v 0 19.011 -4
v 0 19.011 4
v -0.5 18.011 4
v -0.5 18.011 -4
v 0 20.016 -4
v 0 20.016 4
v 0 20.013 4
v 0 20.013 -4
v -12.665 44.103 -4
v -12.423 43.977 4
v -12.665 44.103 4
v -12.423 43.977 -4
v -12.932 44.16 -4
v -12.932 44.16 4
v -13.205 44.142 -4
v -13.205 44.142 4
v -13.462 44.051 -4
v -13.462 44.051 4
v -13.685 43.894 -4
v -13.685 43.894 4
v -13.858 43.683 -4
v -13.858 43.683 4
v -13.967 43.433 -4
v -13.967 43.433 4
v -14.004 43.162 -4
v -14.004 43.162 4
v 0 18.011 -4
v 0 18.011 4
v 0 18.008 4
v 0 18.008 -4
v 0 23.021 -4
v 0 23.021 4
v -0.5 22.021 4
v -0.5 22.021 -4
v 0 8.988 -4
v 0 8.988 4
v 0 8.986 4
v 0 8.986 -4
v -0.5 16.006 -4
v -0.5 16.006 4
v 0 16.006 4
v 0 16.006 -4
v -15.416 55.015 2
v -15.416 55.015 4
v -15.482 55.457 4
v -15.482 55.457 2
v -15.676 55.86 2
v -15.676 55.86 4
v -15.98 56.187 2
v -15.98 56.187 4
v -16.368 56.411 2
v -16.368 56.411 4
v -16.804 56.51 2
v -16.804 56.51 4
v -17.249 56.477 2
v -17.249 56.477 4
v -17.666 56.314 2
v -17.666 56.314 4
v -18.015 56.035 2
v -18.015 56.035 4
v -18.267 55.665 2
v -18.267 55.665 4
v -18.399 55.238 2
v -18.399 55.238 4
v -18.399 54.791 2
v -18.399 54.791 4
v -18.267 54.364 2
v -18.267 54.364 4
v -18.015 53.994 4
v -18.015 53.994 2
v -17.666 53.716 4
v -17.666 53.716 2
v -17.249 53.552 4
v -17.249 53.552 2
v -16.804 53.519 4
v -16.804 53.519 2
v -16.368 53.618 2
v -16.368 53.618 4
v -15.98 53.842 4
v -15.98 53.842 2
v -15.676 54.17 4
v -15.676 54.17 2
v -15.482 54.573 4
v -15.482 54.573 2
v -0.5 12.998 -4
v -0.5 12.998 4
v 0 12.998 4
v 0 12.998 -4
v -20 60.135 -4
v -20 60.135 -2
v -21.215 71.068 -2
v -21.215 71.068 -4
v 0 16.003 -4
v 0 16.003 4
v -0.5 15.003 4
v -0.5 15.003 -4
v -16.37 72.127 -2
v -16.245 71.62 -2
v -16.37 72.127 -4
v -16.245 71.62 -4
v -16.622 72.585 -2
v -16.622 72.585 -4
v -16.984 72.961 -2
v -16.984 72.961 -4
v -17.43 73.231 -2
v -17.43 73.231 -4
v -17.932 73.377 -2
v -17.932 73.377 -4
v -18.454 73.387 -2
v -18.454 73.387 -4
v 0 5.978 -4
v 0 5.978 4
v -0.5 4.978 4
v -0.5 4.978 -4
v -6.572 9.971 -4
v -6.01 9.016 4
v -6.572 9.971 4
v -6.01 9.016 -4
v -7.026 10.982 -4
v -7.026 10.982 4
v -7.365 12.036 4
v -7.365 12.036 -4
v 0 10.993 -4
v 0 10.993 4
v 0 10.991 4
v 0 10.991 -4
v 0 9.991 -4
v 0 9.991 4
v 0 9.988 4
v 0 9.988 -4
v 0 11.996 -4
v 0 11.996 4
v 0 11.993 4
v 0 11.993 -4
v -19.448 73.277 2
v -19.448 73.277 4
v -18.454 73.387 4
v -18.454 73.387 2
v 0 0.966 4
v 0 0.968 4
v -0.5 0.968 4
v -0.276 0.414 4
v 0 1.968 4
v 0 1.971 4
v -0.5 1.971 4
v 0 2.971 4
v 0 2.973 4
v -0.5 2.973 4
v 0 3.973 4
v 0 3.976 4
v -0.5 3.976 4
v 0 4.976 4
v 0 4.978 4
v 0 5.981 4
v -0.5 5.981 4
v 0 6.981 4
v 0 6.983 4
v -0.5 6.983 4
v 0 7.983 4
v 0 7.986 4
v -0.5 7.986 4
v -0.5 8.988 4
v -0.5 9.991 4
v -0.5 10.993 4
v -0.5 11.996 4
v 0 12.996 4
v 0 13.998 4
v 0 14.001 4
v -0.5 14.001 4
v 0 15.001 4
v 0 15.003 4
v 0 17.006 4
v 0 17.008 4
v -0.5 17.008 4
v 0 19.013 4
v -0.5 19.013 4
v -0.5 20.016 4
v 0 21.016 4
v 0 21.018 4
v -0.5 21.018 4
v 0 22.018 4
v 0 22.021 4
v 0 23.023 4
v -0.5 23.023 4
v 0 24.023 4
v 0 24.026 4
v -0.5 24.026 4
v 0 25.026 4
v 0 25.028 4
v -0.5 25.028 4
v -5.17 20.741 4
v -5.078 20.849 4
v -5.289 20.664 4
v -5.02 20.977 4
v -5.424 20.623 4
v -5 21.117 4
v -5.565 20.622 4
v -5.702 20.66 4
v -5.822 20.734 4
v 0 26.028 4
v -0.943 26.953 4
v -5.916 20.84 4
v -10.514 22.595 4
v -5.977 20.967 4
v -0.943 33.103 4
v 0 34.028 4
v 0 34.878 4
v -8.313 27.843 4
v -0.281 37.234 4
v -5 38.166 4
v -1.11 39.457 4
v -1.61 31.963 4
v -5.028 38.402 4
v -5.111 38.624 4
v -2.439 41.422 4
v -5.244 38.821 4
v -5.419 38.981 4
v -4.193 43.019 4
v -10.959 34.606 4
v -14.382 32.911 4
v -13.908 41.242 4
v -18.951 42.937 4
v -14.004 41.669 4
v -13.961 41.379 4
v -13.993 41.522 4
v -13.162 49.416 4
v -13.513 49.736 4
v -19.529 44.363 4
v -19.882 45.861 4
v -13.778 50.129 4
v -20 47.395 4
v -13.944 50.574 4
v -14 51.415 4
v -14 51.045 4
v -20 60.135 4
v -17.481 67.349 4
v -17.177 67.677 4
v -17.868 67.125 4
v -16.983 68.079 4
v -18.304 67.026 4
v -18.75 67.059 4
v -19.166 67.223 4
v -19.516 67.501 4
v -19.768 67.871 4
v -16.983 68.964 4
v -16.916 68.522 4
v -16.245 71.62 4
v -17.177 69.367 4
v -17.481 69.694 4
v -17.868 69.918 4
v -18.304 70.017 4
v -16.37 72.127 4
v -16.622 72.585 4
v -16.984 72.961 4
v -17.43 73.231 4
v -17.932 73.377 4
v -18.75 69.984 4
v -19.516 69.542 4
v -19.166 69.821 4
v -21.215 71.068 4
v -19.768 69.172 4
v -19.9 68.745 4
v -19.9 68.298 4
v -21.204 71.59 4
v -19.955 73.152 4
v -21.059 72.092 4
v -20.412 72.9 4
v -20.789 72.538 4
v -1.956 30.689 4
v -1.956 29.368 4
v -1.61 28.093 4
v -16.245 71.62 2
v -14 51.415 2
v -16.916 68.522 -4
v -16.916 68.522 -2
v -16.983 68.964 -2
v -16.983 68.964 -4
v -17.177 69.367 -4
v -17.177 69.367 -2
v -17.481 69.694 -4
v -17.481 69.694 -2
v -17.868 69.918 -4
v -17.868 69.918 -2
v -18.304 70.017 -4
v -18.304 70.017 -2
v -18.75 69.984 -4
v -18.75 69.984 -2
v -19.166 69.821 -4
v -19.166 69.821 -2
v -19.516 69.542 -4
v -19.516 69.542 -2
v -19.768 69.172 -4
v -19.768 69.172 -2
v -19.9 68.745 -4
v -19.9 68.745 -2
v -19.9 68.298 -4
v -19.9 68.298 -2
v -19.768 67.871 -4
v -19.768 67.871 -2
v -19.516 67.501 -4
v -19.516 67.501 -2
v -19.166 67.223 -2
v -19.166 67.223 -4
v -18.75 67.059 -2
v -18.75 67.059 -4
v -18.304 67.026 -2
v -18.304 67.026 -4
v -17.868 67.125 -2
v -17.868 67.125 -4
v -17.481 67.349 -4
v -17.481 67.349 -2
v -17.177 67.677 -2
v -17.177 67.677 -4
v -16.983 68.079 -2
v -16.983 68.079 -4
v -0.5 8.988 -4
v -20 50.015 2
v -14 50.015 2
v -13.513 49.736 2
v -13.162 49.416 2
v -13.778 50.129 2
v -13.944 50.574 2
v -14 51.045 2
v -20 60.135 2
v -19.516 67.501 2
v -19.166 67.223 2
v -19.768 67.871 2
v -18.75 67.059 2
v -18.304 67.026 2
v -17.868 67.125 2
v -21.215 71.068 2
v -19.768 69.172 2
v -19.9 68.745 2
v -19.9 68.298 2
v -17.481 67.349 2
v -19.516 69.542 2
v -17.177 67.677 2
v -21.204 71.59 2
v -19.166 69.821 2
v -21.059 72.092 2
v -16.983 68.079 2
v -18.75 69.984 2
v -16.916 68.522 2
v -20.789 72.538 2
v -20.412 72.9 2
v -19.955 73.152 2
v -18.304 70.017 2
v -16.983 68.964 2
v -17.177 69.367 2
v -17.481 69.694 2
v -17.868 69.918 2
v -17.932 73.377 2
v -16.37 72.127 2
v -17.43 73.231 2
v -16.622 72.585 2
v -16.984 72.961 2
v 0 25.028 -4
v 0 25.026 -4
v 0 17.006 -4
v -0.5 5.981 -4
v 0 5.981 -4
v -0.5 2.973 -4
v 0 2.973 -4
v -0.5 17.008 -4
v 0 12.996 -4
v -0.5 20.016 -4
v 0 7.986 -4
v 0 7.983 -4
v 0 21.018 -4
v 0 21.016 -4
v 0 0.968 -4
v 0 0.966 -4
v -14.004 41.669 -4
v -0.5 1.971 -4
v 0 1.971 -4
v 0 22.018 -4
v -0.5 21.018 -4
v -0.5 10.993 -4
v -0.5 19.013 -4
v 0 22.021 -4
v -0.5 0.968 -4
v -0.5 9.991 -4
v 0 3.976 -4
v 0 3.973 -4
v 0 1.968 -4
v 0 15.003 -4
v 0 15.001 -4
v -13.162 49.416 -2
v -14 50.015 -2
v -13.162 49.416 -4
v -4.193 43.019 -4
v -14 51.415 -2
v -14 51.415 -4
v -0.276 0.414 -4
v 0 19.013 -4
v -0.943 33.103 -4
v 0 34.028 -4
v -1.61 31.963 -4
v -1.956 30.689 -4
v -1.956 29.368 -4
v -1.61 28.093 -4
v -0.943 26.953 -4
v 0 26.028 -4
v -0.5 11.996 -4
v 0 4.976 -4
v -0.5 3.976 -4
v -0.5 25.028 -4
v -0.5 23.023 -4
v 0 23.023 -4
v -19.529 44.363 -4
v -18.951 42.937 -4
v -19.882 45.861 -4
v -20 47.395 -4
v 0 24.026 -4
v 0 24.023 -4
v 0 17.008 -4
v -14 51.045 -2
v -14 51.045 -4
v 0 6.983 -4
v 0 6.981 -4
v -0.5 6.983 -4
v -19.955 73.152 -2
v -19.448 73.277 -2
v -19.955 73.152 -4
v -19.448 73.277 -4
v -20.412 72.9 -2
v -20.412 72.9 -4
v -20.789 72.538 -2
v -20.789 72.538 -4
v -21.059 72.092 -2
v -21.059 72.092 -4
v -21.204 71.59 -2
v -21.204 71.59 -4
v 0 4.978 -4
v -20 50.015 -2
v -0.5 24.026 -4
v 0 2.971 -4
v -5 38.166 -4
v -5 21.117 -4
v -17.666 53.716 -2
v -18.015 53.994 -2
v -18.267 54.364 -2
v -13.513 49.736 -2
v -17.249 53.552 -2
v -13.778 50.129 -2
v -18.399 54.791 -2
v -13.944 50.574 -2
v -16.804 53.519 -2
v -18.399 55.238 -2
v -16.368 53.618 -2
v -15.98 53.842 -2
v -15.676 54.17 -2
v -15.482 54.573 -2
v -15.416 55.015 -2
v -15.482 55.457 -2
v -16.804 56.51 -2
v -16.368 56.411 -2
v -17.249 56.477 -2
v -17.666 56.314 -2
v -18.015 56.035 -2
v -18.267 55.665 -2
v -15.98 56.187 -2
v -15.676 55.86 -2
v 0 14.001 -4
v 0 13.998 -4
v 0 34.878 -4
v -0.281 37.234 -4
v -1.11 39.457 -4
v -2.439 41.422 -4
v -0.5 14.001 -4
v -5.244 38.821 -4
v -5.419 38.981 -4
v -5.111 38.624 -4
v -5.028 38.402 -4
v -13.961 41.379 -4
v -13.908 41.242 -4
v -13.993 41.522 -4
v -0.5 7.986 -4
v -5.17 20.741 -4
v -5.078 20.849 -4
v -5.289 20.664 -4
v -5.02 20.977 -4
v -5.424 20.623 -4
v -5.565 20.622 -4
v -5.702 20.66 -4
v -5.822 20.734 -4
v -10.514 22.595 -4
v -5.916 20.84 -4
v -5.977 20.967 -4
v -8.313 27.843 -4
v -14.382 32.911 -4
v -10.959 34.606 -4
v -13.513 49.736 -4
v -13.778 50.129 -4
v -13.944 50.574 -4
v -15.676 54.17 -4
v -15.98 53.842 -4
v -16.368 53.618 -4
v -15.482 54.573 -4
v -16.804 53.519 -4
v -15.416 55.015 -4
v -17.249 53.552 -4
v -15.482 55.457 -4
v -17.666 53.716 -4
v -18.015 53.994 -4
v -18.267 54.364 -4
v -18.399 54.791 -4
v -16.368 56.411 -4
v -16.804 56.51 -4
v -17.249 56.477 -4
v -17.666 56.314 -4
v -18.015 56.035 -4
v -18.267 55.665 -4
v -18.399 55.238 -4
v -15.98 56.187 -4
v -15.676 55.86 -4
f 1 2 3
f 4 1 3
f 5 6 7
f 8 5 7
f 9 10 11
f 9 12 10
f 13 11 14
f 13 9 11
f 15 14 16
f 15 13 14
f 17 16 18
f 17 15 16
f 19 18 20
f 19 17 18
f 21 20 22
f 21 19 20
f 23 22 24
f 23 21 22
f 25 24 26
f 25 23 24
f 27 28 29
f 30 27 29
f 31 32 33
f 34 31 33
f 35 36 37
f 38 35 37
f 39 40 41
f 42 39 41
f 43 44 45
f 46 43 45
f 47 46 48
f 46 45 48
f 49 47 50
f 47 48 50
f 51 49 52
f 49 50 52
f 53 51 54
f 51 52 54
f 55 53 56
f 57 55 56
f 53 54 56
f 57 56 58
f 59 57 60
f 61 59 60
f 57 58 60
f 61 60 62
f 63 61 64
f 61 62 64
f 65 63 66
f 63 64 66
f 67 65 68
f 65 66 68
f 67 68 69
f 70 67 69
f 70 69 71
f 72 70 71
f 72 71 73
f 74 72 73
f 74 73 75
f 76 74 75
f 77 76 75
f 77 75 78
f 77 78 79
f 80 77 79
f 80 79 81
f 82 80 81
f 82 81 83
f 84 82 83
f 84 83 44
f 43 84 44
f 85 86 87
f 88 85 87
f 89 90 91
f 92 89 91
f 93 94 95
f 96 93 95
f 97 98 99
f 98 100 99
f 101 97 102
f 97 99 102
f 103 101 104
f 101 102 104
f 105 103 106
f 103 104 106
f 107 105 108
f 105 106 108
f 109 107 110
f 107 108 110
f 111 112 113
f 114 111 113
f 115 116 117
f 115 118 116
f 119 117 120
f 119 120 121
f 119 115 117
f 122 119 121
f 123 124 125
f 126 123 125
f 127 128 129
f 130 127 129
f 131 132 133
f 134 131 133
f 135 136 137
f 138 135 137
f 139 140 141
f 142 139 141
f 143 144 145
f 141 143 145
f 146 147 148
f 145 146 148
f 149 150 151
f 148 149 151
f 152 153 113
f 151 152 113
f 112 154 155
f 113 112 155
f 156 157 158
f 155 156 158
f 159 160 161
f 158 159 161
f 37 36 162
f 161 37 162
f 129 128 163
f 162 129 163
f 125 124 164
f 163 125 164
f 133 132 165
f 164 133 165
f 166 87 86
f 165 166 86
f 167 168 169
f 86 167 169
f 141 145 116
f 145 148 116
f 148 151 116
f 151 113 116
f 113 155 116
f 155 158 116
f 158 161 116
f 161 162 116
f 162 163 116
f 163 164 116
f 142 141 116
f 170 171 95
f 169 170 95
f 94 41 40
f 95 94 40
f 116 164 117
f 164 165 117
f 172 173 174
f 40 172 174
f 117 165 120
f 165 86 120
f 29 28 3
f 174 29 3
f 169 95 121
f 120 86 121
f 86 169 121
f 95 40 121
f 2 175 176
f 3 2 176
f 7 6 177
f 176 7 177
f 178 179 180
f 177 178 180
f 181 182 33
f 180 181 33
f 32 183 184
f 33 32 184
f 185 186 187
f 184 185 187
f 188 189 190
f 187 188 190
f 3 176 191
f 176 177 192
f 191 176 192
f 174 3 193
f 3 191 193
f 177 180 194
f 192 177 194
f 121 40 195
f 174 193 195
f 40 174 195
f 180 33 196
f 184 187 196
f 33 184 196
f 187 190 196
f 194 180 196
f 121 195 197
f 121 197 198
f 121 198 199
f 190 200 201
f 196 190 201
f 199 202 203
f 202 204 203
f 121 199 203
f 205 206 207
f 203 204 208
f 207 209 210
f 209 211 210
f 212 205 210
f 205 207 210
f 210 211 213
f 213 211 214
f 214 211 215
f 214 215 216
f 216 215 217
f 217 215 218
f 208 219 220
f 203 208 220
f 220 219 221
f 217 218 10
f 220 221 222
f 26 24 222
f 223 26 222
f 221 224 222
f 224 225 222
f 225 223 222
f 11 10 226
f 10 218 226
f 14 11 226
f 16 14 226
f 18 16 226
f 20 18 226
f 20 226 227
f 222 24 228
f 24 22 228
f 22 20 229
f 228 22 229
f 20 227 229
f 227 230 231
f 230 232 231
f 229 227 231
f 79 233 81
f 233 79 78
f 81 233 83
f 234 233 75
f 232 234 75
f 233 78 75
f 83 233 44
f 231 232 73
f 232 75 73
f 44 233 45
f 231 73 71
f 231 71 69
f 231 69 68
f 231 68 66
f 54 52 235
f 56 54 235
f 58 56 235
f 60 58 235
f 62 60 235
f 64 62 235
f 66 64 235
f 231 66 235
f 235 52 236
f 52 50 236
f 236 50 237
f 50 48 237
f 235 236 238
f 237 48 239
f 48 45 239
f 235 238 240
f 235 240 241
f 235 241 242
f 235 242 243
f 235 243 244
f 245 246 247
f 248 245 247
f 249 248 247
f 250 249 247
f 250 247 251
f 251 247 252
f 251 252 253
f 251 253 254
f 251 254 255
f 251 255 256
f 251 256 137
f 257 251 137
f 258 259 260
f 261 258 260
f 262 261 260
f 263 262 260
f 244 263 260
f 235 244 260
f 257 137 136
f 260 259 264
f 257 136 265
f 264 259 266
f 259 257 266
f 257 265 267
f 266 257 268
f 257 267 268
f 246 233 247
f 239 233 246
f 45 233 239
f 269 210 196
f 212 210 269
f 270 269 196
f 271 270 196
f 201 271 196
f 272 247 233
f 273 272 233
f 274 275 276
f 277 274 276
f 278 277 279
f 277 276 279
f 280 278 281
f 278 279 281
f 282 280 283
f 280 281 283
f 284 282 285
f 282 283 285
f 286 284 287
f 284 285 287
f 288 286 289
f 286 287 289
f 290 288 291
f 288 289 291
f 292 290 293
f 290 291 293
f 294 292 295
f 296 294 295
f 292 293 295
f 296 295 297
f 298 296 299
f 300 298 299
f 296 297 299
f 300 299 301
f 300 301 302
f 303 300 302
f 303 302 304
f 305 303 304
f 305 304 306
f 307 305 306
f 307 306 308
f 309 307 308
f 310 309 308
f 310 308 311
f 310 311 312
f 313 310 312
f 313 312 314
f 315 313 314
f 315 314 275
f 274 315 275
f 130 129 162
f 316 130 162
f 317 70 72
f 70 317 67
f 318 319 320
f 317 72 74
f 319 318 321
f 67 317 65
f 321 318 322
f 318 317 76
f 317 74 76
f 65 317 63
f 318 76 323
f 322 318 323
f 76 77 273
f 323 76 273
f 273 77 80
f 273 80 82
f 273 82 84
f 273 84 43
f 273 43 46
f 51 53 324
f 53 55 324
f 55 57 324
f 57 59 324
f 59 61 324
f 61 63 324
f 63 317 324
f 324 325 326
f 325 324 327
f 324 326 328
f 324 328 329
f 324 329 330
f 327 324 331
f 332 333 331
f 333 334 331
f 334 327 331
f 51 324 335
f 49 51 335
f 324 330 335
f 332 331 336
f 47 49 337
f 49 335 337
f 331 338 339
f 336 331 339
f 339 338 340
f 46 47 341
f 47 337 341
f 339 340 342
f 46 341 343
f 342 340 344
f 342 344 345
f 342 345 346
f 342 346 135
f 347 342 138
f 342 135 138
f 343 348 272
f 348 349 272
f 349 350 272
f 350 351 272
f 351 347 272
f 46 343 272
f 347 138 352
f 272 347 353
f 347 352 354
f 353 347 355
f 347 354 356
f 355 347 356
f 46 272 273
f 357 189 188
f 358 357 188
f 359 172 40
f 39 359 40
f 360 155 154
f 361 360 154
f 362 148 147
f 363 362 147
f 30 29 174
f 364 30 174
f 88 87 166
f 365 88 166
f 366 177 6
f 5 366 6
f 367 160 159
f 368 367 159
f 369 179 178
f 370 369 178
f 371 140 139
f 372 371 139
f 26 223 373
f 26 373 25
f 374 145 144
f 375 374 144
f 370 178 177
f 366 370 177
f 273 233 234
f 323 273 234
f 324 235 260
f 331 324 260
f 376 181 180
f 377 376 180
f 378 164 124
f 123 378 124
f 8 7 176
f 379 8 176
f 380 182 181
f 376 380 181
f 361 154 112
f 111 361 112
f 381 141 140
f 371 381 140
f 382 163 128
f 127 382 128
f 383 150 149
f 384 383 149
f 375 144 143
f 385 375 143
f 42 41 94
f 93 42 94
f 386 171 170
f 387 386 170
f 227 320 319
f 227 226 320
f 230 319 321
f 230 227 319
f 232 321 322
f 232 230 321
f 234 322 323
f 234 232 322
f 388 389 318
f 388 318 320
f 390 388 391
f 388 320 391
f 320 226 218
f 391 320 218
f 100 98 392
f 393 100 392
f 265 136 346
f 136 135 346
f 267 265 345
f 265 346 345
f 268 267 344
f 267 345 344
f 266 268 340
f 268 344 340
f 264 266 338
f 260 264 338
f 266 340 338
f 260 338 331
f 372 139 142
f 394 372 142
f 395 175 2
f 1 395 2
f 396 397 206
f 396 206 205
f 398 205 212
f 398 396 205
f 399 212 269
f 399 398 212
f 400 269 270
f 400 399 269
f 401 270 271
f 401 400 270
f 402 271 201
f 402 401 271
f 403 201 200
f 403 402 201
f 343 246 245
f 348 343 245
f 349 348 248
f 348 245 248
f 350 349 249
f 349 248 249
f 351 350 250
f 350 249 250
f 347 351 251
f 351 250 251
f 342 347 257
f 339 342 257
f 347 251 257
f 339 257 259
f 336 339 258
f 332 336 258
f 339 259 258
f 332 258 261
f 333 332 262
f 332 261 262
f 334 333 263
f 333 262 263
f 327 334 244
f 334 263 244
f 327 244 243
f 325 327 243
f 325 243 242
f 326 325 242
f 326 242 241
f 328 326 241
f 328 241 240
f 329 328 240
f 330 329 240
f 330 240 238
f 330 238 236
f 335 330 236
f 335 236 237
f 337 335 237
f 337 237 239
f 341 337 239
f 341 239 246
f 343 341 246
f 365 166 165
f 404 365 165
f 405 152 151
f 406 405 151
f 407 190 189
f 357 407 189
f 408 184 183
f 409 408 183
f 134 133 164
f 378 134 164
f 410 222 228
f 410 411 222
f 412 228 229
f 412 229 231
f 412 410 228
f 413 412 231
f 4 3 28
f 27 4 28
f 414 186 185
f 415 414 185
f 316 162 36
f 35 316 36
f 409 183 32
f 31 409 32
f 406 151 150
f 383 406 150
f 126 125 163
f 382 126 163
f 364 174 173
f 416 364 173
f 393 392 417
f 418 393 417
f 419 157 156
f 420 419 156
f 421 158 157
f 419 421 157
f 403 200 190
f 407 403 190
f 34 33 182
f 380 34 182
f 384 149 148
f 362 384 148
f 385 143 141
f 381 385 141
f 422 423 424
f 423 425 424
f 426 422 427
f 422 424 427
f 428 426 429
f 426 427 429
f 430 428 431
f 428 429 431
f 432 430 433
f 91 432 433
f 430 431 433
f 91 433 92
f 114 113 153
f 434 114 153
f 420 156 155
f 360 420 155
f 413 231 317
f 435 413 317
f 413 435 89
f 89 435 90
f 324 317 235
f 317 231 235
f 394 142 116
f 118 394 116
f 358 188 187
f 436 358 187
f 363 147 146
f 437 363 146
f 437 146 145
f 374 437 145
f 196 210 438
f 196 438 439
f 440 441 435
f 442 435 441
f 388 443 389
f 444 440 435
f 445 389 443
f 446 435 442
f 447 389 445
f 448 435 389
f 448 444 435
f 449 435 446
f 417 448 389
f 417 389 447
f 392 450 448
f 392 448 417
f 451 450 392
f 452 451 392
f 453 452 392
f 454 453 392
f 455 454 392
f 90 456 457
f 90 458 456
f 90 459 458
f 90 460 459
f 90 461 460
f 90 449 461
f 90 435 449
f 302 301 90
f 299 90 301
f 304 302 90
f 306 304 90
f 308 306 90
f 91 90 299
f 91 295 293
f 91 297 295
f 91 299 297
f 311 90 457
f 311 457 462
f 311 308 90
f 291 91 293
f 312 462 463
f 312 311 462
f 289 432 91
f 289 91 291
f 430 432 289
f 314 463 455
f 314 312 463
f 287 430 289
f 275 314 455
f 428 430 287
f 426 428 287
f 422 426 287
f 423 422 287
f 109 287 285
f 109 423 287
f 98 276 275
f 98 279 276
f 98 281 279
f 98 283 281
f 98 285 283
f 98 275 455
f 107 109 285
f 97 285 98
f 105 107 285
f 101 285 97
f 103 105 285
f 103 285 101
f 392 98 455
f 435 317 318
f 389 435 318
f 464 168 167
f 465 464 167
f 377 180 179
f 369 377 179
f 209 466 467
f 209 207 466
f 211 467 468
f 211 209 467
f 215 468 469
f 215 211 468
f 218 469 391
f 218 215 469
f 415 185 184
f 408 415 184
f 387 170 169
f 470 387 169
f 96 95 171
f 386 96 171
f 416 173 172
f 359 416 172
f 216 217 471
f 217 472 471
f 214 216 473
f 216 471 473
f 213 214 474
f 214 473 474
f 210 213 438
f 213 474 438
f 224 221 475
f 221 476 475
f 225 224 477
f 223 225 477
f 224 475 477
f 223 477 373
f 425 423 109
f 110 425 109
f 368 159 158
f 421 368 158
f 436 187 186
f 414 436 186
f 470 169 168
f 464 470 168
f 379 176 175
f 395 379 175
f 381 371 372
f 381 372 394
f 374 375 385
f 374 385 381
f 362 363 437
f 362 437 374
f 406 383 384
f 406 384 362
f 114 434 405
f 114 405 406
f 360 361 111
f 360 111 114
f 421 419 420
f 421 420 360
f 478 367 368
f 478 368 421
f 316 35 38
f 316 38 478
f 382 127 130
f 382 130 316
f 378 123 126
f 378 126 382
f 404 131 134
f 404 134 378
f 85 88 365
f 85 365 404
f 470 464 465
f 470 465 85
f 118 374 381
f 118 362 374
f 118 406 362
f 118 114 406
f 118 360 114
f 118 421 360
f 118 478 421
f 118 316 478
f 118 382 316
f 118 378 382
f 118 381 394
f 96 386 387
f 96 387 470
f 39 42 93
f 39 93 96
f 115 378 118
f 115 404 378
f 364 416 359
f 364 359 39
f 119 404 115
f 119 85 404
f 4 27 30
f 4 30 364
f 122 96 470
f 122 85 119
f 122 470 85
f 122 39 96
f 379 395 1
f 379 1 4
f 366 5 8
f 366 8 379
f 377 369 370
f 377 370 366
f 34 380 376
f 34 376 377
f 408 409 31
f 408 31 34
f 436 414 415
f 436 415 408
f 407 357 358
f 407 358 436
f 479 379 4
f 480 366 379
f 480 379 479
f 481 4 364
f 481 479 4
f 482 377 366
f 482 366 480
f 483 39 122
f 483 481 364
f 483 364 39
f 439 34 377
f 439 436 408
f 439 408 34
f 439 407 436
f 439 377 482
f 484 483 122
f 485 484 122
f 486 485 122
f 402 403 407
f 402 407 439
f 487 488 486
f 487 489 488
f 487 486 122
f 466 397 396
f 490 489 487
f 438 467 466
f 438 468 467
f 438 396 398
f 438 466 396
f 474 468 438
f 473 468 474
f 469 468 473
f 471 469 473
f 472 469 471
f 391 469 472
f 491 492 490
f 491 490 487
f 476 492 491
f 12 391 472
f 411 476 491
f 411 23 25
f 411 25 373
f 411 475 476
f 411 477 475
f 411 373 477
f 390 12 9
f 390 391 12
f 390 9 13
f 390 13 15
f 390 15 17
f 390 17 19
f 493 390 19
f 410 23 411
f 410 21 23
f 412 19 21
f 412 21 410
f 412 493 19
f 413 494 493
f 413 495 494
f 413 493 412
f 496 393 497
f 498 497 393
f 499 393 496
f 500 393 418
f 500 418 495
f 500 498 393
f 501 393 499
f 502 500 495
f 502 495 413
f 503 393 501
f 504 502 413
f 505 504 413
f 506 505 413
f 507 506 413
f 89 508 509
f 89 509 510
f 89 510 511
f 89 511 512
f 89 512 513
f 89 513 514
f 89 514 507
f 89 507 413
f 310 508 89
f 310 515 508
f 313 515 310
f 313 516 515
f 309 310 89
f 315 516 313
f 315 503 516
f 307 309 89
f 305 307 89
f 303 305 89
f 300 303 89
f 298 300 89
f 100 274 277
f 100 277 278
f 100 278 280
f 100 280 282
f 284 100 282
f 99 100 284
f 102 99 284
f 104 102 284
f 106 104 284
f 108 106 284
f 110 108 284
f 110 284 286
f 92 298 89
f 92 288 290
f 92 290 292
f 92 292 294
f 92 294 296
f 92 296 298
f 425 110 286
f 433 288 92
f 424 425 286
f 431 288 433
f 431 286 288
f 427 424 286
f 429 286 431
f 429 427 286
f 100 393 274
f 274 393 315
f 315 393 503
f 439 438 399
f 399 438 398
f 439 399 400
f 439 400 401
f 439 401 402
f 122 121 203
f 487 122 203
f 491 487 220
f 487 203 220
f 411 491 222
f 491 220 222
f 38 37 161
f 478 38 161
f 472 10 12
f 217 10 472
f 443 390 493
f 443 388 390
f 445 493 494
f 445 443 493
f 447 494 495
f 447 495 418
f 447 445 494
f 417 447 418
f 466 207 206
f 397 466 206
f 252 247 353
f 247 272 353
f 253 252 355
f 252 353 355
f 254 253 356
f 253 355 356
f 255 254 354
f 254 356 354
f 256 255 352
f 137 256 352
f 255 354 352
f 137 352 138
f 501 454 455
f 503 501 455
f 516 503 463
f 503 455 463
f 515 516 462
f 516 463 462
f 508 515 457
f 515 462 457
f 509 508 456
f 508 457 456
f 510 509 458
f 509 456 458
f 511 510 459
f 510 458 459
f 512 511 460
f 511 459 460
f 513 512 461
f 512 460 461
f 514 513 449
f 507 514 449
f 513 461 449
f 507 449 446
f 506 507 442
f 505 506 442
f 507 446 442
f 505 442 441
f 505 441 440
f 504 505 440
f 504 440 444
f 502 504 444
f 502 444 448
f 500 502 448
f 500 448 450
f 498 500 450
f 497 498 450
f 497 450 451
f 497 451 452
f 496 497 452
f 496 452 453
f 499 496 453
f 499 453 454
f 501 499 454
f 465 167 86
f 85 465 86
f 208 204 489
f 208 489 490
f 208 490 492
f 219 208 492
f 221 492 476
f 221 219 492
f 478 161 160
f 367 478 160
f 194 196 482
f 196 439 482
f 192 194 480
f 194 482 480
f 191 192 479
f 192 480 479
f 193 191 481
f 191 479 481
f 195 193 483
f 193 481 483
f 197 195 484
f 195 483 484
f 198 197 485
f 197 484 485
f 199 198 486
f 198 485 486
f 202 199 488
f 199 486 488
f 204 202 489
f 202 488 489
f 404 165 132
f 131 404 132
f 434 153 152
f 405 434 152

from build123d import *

# Parameters (mm, degrees)
BOSS_EXTRUDE1_DEPTH     = 4
SKETCH3_W               = 20
SKETCH3_H               = 25
CUT_EXTRUDE1_DEPTH      = 2
CUT_EXTRUDE2_DEPTH      = 78.081938119
CUT_EXTRUDE2_DEPTH_BACK = 78.081938119
CUT_EXTRUDE3_DEPTH      = 78.081938119
LPATTERN1_COUNT         = 26
LPATTERN1_PITCH         = 1.0025
CUT_EXTRUDE4_DEPTH      = 78.081938119
CUT_EXTRUDE5_DEPTH      = 78.081938119
FILLET1_R               = 10
FILLET2_R               = 2
FILLET3_R               = 1
FILLET4_R               = 0.5
SKETCH9_R               = 1.5
CUT_EXTRUDE6_DEPTH      = 77.824835617


with BuildPart() as part:
    # Sketch1 → Boss-Extrude1 (new, symmetric)
    with BuildSketch(Plane.XY):
        Polygon((0, 0), (-20, 30.005392849), (-20, 60.135392849), (-21.435566599, 73.055886204), (-16.466146078, 73.608027203), (-14.000284373, 51.414595156), (-14.000284373, 50.014595156), (0, 40.028289364), align=None)
    extrude(amount=BOSS_EXTRUDE1_DEPTH, both=True)

    # Sketch3 → Cut-Extrude1 (cut, symmetric)
    with BuildSketch(Plane.XY):
        with Locations((-24.000284373, 62.514595156)):
            Rectangle(SKETCH3_W, SKETCH3_H)
    extrude(amount=CUT_EXTRUDE1_DEPTH, both=True, mode=Mode.SUBTRACT)

    # Sketch5 → Cut-Extrude2 (cut, two sides: drawn at the far end of the back side and taken through both)
    with BuildSketch(Plane.XY.offset(4).offset(-CUT_EXTRUDE2_DEPTH_BACK)):
        with BuildLine():
            Line((91.496624596, 102.650757811), (0, 34.028289364))
            ThreePointArc((0, 34.028289364), (-2, 30.028289364), (0, 26.028289364))
            Line((0, 26.028289364), (91.496624596, -42.594179083))
            Line((91.496624596, -42.594179083), (320.238186086, -42.594179083))
            Line((320.238186086, -42.594179083), (320.238186086, 102.650757811))
            Line((320.238186086, 102.650757811), (91.496624596, 102.650757811))
        make_face()
    extrude(amount=CUT_EXTRUDE2_DEPTH + CUT_EXTRUDE2_DEPTH_BACK, mode=Mode.SUBTRACT)

    # Sketch6 → Cut-Extrude3 (cut, through all)
    with BuildSketch(Plane.XY.offset(4)):
        Polygon((0, 26.028289364), (-0.5, 25.028289364), (0, 25.028289364), align=None)
    cut_extrude3 = extrude(amount=-CUT_EXTRUDE3_DEPTH, mode=Mode.SUBTRACT)

    # LPattern1: Cut-Extrude3 ×26
    with Locations(*[(0, -i * LPATTERN1_PITCH, 0) for i in range(1, LPATTERN1_COUNT)]):
        add(cut_extrude3, mode=Mode.SUBTRACT)

    # Sketch7 → Cut-Extrude4 (cut, through all)
    with BuildSketch(Plane.XY.offset(4)):
        with BuildLine():
            Line((-20, 45.005392849), (-20, 30.005392849))
            Line((-20, 30.005392849), (-6.955074875, 10.434487696))
            ThreePointArc((-6.955074875, 10.434487696), (-12.476218242, 28.097776313), (-20, 45.005392849))
        make_face()
    extrude(amount=-CUT_EXTRUDE4_DEPTH, mode=Mode.SUBTRACT)

    # Sketch8 → Cut-Extrude5 (cut, through all)
    with BuildSketch(Plane.XY.offset(4)):
        with BuildLine():
            Line((-14.004117633, 45.104021749), (-5, 38.681447059))
            Line((-5, 38.681447059), (-5, 17.744021749))
            ThreePointArc((-5, 17.744021749), (-9.031897039, 29.772645882), (-14.004117633, 41.444021749))
            Line((-14.004117633, 41.444021749), (-14.004117633, 45.104021749))
        make_face()
    extrude(amount=-CUT_EXTRUDE5_DEPTH, mode=Mode.SUBTRACT)

    # Fillet1
    fillet1_edges = [part.edges().sort_by_distance(p)[0] for p in [
        (0, 40.028289364, 0),
        (-20, 45.005392849, 0),
        (-6.955074875, 10.434487696, 0),
    ]]
    fillet(fillet1_edges, radius=FILLET1_R)

    # Fillet2
    fillet2_edges = [part.edges().sort_by_distance(p)[0] for p in [
        (-21.435566599, 73.055886204, 3),
        (-16.466146078, 73.608027203, 3),
        (-14.000284373, 50.014595156, 3),
        (-21.435566599, 73.055886204, -3),
        (-16.466146078, 73.608027203, -3),
        (-14.000284373, 50.014595156, -3),
    ]]
    fillet(fillet2_edges, radius=FILLET2_R)

    # Fillet3
    fillet3_edges = [part.edges().sort_by_distance(p)[0] for p in [
        (-14.004117633, 41.444021749, 0),
        (-14.004117633, 45.104021749, 0),
        (-5, 38.681447059, 0),
    ]]
    fillet(fillet3_edges, radius=FILLET3_R)

    # Fillet4
    fillet4_edges = [part.edges().sort_by_distance(p)[0] for p in [
        (-5, 17.744021749, 0),
    ]]
    fillet(fillet4_edges, radius=FILLET4_R)

    # Sketch9 → Cut-Extrude6 (cut, through all)
    with BuildSketch(Plane.XY.offset(4)):
        with Locations((-18.416383851, 68.521557639)):
            Circle(SKETCH9_R)
        with Locations((-16.915664614, 55.014672662)):
            Circle(SKETCH9_R)
    extrude(amount=-CUT_EXTRUDE6_DEPTH, mode=Mode.SUBTRACT)


solid = part.part
